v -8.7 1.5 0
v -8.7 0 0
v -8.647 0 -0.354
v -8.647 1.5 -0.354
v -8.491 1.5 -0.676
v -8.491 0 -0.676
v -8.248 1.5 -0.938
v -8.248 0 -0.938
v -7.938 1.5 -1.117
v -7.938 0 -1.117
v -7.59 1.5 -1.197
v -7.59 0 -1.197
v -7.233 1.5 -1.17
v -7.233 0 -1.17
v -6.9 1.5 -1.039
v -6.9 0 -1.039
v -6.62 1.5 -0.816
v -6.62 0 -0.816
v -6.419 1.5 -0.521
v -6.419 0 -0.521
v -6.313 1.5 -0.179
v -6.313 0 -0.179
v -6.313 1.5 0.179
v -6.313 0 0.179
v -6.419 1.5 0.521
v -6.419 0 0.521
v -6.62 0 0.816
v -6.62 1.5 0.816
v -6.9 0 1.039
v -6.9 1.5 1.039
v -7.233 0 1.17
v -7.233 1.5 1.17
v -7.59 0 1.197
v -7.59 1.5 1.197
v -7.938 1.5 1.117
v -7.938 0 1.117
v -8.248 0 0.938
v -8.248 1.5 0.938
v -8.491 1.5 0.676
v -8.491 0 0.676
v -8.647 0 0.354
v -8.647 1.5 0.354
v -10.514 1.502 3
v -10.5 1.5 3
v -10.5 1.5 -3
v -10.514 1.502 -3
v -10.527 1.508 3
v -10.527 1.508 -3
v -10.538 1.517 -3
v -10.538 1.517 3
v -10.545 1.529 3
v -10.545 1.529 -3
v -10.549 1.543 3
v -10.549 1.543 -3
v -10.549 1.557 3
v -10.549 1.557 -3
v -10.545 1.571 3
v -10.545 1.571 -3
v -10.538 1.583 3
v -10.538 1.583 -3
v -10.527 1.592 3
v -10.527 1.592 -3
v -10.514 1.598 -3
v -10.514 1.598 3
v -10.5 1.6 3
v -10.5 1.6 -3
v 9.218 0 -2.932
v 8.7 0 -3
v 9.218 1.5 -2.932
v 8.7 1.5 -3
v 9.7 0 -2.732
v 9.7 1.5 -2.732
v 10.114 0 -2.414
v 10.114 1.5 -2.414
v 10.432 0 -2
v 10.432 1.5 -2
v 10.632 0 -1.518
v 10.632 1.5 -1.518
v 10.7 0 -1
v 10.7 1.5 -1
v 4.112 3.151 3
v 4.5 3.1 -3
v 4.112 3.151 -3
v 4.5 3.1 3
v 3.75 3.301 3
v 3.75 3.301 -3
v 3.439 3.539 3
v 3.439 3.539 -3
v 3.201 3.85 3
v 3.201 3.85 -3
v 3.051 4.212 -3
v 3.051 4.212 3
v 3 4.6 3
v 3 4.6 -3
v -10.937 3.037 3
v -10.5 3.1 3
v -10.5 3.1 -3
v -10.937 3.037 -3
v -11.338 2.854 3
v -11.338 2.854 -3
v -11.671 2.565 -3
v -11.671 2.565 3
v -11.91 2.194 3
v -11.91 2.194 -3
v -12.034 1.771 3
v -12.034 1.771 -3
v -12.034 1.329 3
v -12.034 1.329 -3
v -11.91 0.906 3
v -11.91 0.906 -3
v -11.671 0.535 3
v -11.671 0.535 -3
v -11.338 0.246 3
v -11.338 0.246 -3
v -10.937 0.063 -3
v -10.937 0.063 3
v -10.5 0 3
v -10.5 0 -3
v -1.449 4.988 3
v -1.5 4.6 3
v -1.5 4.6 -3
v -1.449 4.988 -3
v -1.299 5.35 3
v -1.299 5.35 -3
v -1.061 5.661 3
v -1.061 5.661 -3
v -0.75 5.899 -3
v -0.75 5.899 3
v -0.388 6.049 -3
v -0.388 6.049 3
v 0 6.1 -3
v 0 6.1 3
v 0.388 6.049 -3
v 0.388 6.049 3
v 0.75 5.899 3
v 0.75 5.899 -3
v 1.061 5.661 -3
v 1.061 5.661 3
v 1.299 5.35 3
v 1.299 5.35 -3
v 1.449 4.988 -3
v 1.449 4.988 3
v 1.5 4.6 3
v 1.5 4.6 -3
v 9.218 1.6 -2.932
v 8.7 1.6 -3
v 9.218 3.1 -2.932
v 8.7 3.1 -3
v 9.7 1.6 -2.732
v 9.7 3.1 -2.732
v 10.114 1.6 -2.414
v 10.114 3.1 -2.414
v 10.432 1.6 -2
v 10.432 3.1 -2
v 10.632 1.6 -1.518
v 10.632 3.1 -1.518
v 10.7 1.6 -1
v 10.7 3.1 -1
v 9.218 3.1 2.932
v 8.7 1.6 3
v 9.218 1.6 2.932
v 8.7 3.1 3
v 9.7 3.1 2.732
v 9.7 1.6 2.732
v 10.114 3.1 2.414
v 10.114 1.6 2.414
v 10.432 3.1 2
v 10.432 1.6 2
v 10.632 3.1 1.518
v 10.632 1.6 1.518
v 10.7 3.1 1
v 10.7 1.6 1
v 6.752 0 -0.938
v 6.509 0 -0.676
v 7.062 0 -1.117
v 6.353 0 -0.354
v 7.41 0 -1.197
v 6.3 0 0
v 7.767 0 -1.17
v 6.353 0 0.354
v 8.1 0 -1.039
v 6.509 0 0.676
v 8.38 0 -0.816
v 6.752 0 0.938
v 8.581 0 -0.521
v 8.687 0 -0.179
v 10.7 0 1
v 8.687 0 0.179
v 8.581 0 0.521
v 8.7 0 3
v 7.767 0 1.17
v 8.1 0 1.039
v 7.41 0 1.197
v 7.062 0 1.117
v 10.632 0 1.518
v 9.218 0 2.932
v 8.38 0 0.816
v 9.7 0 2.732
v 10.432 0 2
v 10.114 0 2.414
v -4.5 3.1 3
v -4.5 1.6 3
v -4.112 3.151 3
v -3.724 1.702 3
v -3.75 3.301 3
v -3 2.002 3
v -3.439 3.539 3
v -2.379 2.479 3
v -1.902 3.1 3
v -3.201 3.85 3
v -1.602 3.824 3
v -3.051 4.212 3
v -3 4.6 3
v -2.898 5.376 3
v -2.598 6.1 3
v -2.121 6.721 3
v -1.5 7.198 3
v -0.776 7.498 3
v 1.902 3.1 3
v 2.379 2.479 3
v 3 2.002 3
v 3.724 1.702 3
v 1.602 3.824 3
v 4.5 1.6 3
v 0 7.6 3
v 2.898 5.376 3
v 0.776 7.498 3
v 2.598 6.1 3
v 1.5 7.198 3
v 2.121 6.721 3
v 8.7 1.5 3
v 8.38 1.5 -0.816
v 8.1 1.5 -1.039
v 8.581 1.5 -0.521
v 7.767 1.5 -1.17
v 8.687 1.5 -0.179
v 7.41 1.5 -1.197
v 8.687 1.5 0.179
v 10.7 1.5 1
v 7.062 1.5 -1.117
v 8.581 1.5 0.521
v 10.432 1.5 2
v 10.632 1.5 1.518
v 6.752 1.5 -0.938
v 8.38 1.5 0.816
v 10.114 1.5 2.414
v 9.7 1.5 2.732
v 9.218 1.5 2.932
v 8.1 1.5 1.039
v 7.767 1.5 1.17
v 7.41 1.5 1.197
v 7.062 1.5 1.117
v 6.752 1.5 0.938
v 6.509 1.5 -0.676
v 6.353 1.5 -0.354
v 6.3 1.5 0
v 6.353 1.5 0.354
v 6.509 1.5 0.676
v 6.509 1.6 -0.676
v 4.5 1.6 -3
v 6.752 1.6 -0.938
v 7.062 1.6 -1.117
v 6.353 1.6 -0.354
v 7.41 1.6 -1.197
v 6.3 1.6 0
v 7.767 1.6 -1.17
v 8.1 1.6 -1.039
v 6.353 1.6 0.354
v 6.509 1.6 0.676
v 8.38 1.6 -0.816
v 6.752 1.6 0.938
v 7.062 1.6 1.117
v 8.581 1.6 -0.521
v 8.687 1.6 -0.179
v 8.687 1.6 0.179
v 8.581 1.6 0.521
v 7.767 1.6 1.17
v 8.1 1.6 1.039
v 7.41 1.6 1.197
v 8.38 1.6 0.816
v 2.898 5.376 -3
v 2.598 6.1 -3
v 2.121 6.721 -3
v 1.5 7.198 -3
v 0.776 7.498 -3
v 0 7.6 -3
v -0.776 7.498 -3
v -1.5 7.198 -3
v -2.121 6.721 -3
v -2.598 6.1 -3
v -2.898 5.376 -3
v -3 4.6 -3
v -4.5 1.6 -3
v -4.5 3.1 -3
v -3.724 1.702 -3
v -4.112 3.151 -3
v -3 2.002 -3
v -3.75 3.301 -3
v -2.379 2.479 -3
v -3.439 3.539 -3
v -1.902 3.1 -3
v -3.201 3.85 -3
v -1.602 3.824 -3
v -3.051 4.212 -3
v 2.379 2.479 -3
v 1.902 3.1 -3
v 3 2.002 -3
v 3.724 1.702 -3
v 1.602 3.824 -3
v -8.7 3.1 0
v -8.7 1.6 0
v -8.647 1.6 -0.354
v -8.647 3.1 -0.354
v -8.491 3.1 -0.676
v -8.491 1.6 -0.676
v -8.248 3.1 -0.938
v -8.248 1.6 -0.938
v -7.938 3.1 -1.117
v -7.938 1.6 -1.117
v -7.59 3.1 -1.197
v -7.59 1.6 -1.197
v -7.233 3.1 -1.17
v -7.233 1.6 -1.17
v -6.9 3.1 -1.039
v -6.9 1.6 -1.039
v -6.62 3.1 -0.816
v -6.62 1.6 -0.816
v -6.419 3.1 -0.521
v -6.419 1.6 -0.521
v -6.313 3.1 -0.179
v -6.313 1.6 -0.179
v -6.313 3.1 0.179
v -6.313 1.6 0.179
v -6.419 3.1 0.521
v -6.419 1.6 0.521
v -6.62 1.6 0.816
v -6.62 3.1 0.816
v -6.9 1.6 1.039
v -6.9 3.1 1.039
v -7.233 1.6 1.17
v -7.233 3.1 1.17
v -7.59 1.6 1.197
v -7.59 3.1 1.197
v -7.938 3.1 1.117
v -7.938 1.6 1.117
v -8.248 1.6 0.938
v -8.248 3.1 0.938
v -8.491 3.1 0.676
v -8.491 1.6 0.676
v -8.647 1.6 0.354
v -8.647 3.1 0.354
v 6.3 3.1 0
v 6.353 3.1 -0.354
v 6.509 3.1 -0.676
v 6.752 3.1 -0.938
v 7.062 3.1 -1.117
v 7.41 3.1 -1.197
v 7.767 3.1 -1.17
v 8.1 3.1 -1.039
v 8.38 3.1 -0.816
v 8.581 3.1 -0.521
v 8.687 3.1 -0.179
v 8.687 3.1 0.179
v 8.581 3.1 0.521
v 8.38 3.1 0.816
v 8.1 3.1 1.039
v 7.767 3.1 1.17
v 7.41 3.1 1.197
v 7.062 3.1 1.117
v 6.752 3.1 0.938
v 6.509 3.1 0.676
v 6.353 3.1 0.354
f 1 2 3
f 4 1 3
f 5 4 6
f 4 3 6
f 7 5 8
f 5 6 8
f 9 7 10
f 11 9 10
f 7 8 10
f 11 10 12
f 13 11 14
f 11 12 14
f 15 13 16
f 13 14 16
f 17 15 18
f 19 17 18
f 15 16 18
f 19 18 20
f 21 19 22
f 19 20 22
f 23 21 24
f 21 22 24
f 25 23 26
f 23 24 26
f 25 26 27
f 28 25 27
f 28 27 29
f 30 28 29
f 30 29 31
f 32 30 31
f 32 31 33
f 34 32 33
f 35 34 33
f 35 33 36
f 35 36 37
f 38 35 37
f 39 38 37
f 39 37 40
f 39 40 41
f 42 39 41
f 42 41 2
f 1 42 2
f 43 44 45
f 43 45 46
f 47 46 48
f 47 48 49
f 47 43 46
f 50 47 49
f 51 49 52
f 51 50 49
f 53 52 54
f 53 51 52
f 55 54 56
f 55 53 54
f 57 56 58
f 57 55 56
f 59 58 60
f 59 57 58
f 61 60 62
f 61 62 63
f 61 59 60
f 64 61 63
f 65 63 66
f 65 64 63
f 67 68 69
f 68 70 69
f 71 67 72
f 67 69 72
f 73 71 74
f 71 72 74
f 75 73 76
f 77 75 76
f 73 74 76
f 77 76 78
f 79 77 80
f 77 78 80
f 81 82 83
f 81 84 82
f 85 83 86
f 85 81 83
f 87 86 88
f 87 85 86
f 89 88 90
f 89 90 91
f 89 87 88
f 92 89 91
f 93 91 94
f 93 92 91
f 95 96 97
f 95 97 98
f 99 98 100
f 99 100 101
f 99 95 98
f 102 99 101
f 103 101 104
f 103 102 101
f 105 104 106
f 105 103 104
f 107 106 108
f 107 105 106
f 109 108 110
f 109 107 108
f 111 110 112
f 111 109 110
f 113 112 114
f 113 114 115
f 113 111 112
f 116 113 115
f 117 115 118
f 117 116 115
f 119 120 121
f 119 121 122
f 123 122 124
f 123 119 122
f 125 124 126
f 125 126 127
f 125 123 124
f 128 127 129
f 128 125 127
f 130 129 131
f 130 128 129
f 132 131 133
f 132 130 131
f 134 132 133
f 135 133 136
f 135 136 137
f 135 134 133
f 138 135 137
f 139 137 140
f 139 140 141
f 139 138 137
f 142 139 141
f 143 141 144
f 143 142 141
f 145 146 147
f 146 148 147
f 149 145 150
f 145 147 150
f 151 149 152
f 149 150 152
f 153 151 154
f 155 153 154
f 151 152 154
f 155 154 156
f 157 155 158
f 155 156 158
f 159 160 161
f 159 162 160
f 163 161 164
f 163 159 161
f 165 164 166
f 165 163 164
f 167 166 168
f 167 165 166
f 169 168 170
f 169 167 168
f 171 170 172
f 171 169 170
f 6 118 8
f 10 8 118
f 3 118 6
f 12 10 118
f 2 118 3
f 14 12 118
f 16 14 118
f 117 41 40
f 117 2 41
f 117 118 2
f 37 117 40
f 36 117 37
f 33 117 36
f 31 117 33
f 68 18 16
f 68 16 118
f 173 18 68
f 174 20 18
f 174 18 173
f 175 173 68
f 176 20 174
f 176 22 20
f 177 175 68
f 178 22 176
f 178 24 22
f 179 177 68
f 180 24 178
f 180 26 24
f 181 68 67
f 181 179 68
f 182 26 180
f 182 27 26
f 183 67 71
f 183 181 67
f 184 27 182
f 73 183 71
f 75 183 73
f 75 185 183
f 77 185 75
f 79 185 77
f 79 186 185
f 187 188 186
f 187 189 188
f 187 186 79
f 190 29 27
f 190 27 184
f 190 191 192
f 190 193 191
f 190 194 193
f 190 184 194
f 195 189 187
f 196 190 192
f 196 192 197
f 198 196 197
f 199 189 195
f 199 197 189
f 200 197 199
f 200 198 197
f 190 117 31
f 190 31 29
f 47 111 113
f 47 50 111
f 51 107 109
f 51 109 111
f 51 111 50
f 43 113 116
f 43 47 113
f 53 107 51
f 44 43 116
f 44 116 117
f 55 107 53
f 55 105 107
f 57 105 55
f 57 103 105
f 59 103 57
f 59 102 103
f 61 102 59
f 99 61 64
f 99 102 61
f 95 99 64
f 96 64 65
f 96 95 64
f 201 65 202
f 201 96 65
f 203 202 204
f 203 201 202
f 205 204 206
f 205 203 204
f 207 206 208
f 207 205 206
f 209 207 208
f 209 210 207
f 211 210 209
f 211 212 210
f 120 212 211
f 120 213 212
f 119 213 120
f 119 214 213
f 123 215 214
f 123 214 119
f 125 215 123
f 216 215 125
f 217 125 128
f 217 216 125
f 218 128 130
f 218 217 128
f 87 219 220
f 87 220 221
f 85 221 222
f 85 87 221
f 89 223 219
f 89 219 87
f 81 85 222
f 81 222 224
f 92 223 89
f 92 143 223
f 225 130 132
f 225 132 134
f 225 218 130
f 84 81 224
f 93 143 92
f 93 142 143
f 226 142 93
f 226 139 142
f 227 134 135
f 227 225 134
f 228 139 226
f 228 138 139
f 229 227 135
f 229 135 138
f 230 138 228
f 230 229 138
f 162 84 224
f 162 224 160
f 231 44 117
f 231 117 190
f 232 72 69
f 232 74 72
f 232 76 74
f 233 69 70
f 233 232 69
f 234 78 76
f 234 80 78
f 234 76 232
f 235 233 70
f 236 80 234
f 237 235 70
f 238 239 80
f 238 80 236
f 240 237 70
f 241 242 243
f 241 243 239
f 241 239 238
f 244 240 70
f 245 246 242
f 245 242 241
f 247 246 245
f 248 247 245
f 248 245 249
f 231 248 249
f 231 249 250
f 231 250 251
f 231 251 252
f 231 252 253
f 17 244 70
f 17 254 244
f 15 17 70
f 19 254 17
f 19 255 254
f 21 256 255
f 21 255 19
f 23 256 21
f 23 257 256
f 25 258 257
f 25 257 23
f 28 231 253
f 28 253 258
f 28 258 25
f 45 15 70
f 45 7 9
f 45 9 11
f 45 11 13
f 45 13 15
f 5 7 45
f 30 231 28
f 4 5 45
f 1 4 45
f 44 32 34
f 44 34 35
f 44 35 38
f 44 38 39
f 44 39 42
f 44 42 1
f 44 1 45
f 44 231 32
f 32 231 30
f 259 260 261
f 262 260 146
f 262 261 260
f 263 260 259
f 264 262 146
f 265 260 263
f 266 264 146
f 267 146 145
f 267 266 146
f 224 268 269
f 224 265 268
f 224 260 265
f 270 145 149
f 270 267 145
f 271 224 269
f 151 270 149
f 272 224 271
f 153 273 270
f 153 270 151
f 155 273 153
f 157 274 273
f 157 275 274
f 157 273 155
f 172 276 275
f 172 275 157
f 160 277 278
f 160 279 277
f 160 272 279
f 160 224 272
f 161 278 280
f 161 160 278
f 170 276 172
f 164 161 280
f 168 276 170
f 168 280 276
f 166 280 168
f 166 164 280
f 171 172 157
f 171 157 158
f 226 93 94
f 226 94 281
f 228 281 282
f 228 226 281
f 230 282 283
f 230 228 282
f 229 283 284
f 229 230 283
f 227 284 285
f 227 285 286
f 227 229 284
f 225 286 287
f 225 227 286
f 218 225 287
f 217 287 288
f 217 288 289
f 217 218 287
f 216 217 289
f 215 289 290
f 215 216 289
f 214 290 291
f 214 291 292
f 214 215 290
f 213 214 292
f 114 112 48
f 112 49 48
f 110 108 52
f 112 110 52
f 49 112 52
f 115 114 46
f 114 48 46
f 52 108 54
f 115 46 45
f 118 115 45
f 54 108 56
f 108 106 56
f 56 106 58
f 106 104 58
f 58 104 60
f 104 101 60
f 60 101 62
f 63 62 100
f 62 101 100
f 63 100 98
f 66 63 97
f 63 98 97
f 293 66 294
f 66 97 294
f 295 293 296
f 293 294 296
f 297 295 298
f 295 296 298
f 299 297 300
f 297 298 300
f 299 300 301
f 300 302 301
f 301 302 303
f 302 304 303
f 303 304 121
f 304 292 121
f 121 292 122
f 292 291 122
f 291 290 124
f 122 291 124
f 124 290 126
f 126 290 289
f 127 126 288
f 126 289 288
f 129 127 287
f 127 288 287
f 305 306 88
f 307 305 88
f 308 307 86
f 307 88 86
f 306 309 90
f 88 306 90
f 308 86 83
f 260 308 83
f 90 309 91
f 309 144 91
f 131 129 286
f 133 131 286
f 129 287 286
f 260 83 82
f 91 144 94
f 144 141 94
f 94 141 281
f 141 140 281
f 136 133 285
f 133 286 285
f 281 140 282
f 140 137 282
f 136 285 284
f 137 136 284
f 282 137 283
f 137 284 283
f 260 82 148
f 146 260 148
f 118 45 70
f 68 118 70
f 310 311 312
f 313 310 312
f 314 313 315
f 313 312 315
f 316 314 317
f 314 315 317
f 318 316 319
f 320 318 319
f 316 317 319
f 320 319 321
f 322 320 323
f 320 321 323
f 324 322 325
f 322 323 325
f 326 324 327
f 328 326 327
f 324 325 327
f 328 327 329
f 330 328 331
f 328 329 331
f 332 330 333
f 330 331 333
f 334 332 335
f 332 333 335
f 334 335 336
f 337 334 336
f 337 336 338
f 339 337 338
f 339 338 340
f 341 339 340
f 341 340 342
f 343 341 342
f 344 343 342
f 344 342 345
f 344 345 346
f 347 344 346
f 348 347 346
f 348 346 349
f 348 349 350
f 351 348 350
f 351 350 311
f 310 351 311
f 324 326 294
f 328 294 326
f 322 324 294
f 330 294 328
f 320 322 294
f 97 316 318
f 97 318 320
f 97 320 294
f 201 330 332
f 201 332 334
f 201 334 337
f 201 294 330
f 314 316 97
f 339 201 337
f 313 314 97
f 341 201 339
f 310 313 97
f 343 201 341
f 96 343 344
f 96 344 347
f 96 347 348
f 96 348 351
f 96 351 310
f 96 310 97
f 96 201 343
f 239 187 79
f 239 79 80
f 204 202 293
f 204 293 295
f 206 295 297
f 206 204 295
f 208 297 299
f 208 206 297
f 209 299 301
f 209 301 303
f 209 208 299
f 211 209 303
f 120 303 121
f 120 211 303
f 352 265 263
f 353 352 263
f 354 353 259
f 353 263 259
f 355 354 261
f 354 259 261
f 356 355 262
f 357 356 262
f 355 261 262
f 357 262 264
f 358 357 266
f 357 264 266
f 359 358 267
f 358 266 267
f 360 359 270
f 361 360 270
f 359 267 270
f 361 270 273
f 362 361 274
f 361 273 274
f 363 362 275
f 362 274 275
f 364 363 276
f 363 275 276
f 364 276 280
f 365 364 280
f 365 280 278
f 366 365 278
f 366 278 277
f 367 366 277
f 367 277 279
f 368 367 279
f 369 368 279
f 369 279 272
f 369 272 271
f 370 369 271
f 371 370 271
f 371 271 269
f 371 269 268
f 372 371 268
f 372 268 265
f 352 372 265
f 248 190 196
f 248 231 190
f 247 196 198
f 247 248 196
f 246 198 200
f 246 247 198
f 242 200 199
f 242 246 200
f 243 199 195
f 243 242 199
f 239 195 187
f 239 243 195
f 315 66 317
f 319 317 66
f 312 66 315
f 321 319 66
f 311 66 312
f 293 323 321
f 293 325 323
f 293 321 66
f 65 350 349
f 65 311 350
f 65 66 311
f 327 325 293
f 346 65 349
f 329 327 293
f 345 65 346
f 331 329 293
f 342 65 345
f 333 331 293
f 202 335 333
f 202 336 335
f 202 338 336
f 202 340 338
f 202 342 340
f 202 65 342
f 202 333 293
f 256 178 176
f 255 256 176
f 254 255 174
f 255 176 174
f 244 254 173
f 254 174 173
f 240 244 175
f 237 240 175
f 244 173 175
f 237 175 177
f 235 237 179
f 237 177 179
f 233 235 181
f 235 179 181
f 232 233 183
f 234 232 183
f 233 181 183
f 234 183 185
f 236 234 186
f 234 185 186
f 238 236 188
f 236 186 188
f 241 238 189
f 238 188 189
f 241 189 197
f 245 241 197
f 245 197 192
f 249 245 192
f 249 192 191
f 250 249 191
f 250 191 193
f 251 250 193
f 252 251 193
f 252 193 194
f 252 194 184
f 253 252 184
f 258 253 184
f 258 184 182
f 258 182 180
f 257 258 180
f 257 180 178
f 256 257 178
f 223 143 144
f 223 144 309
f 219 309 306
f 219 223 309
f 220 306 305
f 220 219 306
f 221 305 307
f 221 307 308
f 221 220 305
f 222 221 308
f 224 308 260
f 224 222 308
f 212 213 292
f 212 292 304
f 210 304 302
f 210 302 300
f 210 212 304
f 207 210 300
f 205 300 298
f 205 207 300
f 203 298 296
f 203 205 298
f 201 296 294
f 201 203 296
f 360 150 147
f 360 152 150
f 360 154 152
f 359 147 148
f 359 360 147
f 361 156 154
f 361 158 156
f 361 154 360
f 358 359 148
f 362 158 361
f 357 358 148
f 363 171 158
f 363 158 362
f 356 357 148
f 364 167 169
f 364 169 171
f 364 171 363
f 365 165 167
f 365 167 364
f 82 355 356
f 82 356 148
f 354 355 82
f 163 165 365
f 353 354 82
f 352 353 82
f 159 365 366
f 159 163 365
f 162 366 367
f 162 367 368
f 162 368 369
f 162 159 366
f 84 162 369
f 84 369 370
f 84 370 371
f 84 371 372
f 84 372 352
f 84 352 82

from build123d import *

# Parameters (mm, degrees)
BOSS_EXTRUDE1_DEPTH  = 3
M2_CLEARANCE_HOLE1_D = 2.4
FILLET1_R            = 2


with BuildPart() as part:
    # Sketch1 → Boss-Extrude1 (new, symmetric)
    with BuildSketch(Plane.XY):
        with BuildLine():
            ThreePointArc((4.5, 3.1), (3.439339828, 3.539339828), (3, 4.6))
            ThreePointArc((3, 4.6), (2.121320344, 6.721320344), (0, 7.6))
            ThreePointArc((0, 7.6), (-2.121320344, 6.721320344), (-3, 4.6))
            ThreePointArc((-3, 4.6), (-3.439339828, 3.539339828), (-4.5, 3.1))
            Line((-4.5, 3.1), (-10.5, 3.1))
            ThreePointArc((-10.5, 3.1), (-12.05, 1.55), (-10.5, 0))
            Line((-10.5, 0), (10.7, 0))
            Line((10.7, 0), (10.7, 1.5))
            Line((10.7, 1.5), (-10.5, 1.5))
            ThreePointArc((-10.5, 1.5), (-10.55, 1.55), (-10.5, 1.6))
            Line((-10.5, 1.6), (-4.5, 1.6))
            ThreePointArc((-4.5, 1.6), (-2.378679656, 2.478679656), (-1.5, 4.6))
            ThreePointArc((-1.5, 4.6), (-1.060660172, 5.660660172), (0, 6.1))
            ThreePointArc((0, 6.1), (1.060660172, 5.660660172), (1.5, 4.6))
            ThreePointArc((1.5, 4.6), (2.378679656, 2.478679656), (4.5, 1.6))
            Line((4.5, 1.6), (10.7, 1.6))
            Line((10.7, 1.6), (10.7, 3.1))
            Line((10.7, 3.1), (4.5, 3.1))
        make_face()
    extrude(amount=BOSS_EXTRUDE1_DEPTH, both=True)

    # M2 Clearance Hole1 (through all)
    with Locations(Plane(origin=(0, 3.1, 0), x_dir=(1, 0, 0), z_dir=(0, 1, 0))):
        with Locations((-7.5, 0), (7.5, 0)):
            Hole(M2_CLEARANCE_HOLE1_D / 2)

    # Fillet1
    fillet1_edges = [part.edges().sort_by_distance(p)[0] for p in [
        (10.7, 2.35, -3),
        (10.7, 0.75, -3),
        (10.7, 0.75, 3),
        (10.7, 2.35, 3),
    ]]
    fillet(fillet1_edges, radius=FILLET1_R)


solid = part.part
